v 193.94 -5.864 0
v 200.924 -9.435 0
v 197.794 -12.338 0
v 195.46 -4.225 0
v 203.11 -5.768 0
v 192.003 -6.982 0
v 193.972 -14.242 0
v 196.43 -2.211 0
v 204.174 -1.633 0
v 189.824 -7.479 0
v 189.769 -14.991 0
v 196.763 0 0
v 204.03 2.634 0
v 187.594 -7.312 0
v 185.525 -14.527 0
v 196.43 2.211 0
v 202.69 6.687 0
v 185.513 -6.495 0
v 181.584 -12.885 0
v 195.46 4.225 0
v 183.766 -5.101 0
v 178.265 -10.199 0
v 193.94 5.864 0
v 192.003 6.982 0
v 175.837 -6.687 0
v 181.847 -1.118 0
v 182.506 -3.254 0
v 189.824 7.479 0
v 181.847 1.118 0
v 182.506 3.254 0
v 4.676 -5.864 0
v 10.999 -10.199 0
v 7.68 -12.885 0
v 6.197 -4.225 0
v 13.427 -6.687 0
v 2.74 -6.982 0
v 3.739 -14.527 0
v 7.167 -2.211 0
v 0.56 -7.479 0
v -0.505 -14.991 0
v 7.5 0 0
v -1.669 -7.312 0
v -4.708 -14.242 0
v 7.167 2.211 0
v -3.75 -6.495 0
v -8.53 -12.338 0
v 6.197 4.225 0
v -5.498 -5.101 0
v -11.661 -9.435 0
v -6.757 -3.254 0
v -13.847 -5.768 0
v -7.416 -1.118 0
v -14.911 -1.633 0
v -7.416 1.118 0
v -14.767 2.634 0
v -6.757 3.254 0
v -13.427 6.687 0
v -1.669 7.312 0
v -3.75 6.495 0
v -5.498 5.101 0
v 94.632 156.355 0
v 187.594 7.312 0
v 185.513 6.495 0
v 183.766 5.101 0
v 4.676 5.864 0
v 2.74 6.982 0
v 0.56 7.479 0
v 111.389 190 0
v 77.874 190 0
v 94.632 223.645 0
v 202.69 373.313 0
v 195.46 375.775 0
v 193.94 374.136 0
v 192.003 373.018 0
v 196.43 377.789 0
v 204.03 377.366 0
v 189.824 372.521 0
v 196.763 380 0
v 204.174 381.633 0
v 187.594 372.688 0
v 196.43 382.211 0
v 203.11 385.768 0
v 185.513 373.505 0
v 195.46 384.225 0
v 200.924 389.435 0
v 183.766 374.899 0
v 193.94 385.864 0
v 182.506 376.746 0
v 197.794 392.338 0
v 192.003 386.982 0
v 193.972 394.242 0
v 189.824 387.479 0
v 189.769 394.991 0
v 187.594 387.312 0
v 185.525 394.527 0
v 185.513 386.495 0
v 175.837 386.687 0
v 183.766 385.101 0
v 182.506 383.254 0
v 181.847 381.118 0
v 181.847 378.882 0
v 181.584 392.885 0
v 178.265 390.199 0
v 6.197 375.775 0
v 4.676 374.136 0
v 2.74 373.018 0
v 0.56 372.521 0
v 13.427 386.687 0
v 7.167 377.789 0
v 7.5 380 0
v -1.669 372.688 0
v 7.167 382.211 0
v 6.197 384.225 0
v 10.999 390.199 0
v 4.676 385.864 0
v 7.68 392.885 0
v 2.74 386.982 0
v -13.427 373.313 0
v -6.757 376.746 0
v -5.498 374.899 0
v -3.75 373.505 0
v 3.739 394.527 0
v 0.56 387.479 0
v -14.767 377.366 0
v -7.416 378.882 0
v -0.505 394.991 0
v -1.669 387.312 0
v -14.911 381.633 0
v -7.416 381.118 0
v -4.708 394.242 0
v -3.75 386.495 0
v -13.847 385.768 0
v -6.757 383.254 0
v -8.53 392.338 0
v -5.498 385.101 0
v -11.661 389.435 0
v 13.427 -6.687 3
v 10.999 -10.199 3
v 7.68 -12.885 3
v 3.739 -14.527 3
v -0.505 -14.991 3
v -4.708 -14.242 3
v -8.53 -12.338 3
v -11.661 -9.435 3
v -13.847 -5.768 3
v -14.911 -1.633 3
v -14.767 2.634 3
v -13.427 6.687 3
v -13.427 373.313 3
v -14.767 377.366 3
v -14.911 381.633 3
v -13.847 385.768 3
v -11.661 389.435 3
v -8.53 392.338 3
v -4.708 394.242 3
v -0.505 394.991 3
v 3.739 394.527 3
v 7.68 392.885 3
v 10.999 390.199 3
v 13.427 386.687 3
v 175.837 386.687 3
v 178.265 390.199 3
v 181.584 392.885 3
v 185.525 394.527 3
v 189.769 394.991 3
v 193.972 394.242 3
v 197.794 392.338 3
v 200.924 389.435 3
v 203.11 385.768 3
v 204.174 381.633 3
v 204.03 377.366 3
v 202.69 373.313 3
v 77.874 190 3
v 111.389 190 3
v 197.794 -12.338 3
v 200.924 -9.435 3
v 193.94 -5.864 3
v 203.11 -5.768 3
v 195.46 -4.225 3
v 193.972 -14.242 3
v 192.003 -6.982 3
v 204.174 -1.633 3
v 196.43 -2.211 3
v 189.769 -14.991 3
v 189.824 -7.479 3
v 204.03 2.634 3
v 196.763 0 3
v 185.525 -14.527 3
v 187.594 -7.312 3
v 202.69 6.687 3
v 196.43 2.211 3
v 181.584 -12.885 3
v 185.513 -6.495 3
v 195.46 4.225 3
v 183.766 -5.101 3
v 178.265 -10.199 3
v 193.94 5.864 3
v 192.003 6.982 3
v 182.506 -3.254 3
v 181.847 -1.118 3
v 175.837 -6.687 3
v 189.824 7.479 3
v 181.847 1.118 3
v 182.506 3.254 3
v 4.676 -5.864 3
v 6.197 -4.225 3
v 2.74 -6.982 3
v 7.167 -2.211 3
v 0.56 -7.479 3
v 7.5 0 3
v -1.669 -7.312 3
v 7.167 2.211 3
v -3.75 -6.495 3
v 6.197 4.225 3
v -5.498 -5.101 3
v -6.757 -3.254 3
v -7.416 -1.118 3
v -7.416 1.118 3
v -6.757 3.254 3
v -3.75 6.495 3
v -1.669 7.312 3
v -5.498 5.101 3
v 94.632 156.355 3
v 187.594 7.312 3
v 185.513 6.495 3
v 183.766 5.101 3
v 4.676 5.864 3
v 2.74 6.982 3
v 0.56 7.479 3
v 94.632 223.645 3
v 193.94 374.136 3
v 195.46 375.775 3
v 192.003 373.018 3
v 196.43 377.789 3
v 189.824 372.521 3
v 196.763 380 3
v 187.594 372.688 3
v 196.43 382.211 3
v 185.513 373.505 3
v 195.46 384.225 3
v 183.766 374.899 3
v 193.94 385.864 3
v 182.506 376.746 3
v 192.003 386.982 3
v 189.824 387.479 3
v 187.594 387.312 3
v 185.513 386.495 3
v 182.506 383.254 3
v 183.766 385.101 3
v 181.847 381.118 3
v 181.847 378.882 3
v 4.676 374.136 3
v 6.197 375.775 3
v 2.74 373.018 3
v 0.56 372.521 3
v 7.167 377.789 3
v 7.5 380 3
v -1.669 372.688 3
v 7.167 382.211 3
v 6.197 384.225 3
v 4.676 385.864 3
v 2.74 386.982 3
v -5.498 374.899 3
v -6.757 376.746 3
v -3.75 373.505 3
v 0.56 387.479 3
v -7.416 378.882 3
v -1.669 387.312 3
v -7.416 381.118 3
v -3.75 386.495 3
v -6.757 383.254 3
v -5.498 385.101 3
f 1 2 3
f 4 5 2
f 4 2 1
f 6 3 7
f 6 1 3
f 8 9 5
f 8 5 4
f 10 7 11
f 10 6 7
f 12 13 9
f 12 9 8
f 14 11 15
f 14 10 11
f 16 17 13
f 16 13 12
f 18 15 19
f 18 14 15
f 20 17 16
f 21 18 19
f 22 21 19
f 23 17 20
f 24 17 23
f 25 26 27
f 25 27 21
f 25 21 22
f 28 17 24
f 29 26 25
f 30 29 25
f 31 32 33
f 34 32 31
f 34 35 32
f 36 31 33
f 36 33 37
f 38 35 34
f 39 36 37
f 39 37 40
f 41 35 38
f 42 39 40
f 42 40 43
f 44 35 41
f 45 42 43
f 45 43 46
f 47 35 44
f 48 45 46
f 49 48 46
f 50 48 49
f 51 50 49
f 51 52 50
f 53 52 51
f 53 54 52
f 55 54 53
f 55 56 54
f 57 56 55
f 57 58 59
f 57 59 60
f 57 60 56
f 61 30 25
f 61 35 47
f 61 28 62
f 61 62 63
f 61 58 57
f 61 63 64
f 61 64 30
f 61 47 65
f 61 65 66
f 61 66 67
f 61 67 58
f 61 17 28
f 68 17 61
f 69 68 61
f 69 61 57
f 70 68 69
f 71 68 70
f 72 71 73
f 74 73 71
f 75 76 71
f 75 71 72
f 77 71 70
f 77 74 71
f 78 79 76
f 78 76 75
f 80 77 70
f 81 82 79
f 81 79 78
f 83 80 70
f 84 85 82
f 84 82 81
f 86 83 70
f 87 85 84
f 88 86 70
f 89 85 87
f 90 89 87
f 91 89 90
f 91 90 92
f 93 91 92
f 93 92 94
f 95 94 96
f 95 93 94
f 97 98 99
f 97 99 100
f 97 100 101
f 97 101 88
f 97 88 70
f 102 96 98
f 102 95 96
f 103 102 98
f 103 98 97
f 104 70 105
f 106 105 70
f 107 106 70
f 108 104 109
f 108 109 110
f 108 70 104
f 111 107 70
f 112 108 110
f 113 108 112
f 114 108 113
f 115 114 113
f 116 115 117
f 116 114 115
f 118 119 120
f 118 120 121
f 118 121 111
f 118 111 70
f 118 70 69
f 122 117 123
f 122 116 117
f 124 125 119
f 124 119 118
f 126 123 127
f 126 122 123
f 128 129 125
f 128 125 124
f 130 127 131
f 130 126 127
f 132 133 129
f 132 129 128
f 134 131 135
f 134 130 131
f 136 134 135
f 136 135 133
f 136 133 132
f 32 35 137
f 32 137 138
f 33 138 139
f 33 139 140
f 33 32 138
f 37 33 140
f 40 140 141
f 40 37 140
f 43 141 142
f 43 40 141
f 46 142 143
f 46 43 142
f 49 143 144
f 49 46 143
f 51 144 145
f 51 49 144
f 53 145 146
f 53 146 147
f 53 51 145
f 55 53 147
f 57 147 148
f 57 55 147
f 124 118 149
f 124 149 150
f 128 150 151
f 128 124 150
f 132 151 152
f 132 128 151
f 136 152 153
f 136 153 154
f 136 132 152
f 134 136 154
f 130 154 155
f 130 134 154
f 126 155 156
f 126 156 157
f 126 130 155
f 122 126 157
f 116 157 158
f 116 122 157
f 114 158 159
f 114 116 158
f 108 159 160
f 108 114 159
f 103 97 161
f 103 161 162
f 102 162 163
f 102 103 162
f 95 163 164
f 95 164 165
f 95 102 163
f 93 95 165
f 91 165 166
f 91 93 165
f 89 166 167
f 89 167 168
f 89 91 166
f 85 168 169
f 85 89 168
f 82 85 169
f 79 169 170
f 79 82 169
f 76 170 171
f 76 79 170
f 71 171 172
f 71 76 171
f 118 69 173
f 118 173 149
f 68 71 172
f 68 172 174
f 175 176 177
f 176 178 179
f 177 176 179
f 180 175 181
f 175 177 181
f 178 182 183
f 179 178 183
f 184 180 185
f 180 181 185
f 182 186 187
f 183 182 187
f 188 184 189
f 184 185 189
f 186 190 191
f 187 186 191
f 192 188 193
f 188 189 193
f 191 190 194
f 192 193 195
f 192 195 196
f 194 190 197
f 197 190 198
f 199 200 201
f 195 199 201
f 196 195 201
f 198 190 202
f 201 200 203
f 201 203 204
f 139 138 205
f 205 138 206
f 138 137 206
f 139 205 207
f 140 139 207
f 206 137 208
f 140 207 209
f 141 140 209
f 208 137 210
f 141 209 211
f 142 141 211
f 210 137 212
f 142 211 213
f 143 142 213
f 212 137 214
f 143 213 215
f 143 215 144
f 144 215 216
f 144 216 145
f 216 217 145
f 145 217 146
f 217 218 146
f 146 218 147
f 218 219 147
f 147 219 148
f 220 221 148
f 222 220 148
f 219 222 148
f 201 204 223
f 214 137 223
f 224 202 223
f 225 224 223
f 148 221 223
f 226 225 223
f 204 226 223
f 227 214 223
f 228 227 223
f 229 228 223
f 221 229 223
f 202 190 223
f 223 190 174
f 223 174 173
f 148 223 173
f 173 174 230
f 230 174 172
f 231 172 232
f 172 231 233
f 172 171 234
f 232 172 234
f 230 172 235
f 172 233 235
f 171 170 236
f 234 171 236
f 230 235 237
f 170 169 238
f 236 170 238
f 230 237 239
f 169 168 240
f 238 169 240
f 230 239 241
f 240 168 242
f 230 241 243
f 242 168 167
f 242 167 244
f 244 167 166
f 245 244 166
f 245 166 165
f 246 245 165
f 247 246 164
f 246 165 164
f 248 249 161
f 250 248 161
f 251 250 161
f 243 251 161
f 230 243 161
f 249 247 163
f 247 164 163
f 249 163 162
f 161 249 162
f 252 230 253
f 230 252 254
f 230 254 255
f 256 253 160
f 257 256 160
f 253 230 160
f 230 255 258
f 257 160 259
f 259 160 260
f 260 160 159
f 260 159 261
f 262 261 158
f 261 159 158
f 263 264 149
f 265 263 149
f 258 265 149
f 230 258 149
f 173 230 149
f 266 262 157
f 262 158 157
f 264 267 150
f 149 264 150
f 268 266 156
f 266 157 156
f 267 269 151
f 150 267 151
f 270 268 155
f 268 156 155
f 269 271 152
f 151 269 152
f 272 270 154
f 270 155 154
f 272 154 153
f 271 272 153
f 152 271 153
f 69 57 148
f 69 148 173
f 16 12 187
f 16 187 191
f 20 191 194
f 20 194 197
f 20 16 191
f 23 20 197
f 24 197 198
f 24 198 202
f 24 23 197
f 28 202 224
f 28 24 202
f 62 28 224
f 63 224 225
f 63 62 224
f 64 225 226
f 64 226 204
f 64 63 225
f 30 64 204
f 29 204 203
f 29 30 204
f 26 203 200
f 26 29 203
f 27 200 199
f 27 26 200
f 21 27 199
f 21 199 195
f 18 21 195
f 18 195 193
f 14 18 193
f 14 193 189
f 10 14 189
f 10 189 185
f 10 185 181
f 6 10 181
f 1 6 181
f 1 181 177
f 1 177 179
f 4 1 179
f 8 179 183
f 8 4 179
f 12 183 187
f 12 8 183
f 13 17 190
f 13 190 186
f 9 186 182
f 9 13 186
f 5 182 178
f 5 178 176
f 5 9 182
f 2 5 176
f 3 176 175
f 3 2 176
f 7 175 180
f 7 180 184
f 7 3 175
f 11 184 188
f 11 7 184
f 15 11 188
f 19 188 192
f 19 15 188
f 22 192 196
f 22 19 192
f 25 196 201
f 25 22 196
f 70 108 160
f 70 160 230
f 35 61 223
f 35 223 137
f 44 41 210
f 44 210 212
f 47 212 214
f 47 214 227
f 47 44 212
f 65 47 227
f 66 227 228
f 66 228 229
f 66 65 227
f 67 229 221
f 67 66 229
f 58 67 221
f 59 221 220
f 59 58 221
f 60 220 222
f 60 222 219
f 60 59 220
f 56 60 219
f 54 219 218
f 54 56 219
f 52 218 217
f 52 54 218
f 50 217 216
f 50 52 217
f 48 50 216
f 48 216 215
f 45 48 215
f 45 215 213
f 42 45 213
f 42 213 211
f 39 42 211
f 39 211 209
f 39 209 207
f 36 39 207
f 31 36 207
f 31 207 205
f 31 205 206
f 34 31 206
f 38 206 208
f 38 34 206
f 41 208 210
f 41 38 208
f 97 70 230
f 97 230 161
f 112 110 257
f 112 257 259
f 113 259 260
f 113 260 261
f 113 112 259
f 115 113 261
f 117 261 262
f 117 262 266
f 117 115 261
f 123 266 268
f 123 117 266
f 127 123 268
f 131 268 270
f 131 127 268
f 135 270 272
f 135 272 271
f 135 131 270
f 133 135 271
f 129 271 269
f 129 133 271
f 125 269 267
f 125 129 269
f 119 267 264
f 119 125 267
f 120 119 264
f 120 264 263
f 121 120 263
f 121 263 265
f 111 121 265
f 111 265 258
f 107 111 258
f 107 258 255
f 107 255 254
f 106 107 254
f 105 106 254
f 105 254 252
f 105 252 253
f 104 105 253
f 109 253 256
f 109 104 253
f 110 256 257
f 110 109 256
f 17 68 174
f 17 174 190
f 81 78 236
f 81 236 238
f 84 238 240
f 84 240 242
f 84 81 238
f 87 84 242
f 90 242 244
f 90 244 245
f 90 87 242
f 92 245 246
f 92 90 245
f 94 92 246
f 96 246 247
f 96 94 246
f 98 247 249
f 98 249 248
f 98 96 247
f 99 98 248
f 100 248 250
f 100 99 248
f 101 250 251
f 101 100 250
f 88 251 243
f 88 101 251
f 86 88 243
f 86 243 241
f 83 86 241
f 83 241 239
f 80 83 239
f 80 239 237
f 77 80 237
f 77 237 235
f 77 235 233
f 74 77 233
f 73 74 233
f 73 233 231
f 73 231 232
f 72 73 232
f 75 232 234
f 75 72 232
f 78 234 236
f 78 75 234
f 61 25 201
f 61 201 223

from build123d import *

# Parameters (mm, degrees)
SKETCH_2_R      = 7.5
EXTRUDE_1_DEPTH = 3


with BuildPart() as part:
    # 草图2 → 凸台-拉伸1 (new body)
    with BuildSketch(Plane.XY):
        with BuildLine():
            Line((-13.426802427, 6.687374417), (77.874173312, 190))
            Line((77.874173312, 190), (-13.426802427, 373.312625583))
            ThreePointArc((-13.426802427, 373.312625583), (-6.687374417, 393.426802427), (13.426802427, 386.687374417))
            Line((13.426802427, 386.687374417), (94.6317, 223.645491634))
            Line((94.6317, 223.645491634), (175.836597573, 386.687374417))
            ThreePointArc((175.836597573, 386.687374417), (195.950774417, 393.426802427), (202.690202427, 373.312625583))
            Line((202.690202427, 373.312625583), (111.389226688, 190))
            Line((111.389226688, 190), (202.690202427, 6.687374417))
            ThreePointArc((202.690202427, 6.687374417), (195.950774417, -13.426802427), (175.836597573, -6.687374417))
            Line((175.836597573, -6.687374417), (94.6317, 156.354508366))
            Line((94.6317, 156.354508366), (13.426802427, -6.687374417))
            ThreePointArc((13.426802427, -6.687374417), (-6.687374417, -13.426802427), (-13.426802427, 6.687374417))
        make_face()
        Circle(SKETCH_2_R, mode=Mode.SUBTRACT)
        with Locations((189.2634, 380)):
            Circle(SKETCH_2_R, mode=Mode.SUBTRACT)
        with Locations((189.2634, 0)):
            Circle(SKETCH_2_R, mode=Mode.SUBTRACT)
        with Locations((0, 380)):
            Circle(SKETCH_2_R, mode=Mode.SUBTRACT)
    extrude(amount=EXTRUDE_1_DEPTH)


solid = part.part
